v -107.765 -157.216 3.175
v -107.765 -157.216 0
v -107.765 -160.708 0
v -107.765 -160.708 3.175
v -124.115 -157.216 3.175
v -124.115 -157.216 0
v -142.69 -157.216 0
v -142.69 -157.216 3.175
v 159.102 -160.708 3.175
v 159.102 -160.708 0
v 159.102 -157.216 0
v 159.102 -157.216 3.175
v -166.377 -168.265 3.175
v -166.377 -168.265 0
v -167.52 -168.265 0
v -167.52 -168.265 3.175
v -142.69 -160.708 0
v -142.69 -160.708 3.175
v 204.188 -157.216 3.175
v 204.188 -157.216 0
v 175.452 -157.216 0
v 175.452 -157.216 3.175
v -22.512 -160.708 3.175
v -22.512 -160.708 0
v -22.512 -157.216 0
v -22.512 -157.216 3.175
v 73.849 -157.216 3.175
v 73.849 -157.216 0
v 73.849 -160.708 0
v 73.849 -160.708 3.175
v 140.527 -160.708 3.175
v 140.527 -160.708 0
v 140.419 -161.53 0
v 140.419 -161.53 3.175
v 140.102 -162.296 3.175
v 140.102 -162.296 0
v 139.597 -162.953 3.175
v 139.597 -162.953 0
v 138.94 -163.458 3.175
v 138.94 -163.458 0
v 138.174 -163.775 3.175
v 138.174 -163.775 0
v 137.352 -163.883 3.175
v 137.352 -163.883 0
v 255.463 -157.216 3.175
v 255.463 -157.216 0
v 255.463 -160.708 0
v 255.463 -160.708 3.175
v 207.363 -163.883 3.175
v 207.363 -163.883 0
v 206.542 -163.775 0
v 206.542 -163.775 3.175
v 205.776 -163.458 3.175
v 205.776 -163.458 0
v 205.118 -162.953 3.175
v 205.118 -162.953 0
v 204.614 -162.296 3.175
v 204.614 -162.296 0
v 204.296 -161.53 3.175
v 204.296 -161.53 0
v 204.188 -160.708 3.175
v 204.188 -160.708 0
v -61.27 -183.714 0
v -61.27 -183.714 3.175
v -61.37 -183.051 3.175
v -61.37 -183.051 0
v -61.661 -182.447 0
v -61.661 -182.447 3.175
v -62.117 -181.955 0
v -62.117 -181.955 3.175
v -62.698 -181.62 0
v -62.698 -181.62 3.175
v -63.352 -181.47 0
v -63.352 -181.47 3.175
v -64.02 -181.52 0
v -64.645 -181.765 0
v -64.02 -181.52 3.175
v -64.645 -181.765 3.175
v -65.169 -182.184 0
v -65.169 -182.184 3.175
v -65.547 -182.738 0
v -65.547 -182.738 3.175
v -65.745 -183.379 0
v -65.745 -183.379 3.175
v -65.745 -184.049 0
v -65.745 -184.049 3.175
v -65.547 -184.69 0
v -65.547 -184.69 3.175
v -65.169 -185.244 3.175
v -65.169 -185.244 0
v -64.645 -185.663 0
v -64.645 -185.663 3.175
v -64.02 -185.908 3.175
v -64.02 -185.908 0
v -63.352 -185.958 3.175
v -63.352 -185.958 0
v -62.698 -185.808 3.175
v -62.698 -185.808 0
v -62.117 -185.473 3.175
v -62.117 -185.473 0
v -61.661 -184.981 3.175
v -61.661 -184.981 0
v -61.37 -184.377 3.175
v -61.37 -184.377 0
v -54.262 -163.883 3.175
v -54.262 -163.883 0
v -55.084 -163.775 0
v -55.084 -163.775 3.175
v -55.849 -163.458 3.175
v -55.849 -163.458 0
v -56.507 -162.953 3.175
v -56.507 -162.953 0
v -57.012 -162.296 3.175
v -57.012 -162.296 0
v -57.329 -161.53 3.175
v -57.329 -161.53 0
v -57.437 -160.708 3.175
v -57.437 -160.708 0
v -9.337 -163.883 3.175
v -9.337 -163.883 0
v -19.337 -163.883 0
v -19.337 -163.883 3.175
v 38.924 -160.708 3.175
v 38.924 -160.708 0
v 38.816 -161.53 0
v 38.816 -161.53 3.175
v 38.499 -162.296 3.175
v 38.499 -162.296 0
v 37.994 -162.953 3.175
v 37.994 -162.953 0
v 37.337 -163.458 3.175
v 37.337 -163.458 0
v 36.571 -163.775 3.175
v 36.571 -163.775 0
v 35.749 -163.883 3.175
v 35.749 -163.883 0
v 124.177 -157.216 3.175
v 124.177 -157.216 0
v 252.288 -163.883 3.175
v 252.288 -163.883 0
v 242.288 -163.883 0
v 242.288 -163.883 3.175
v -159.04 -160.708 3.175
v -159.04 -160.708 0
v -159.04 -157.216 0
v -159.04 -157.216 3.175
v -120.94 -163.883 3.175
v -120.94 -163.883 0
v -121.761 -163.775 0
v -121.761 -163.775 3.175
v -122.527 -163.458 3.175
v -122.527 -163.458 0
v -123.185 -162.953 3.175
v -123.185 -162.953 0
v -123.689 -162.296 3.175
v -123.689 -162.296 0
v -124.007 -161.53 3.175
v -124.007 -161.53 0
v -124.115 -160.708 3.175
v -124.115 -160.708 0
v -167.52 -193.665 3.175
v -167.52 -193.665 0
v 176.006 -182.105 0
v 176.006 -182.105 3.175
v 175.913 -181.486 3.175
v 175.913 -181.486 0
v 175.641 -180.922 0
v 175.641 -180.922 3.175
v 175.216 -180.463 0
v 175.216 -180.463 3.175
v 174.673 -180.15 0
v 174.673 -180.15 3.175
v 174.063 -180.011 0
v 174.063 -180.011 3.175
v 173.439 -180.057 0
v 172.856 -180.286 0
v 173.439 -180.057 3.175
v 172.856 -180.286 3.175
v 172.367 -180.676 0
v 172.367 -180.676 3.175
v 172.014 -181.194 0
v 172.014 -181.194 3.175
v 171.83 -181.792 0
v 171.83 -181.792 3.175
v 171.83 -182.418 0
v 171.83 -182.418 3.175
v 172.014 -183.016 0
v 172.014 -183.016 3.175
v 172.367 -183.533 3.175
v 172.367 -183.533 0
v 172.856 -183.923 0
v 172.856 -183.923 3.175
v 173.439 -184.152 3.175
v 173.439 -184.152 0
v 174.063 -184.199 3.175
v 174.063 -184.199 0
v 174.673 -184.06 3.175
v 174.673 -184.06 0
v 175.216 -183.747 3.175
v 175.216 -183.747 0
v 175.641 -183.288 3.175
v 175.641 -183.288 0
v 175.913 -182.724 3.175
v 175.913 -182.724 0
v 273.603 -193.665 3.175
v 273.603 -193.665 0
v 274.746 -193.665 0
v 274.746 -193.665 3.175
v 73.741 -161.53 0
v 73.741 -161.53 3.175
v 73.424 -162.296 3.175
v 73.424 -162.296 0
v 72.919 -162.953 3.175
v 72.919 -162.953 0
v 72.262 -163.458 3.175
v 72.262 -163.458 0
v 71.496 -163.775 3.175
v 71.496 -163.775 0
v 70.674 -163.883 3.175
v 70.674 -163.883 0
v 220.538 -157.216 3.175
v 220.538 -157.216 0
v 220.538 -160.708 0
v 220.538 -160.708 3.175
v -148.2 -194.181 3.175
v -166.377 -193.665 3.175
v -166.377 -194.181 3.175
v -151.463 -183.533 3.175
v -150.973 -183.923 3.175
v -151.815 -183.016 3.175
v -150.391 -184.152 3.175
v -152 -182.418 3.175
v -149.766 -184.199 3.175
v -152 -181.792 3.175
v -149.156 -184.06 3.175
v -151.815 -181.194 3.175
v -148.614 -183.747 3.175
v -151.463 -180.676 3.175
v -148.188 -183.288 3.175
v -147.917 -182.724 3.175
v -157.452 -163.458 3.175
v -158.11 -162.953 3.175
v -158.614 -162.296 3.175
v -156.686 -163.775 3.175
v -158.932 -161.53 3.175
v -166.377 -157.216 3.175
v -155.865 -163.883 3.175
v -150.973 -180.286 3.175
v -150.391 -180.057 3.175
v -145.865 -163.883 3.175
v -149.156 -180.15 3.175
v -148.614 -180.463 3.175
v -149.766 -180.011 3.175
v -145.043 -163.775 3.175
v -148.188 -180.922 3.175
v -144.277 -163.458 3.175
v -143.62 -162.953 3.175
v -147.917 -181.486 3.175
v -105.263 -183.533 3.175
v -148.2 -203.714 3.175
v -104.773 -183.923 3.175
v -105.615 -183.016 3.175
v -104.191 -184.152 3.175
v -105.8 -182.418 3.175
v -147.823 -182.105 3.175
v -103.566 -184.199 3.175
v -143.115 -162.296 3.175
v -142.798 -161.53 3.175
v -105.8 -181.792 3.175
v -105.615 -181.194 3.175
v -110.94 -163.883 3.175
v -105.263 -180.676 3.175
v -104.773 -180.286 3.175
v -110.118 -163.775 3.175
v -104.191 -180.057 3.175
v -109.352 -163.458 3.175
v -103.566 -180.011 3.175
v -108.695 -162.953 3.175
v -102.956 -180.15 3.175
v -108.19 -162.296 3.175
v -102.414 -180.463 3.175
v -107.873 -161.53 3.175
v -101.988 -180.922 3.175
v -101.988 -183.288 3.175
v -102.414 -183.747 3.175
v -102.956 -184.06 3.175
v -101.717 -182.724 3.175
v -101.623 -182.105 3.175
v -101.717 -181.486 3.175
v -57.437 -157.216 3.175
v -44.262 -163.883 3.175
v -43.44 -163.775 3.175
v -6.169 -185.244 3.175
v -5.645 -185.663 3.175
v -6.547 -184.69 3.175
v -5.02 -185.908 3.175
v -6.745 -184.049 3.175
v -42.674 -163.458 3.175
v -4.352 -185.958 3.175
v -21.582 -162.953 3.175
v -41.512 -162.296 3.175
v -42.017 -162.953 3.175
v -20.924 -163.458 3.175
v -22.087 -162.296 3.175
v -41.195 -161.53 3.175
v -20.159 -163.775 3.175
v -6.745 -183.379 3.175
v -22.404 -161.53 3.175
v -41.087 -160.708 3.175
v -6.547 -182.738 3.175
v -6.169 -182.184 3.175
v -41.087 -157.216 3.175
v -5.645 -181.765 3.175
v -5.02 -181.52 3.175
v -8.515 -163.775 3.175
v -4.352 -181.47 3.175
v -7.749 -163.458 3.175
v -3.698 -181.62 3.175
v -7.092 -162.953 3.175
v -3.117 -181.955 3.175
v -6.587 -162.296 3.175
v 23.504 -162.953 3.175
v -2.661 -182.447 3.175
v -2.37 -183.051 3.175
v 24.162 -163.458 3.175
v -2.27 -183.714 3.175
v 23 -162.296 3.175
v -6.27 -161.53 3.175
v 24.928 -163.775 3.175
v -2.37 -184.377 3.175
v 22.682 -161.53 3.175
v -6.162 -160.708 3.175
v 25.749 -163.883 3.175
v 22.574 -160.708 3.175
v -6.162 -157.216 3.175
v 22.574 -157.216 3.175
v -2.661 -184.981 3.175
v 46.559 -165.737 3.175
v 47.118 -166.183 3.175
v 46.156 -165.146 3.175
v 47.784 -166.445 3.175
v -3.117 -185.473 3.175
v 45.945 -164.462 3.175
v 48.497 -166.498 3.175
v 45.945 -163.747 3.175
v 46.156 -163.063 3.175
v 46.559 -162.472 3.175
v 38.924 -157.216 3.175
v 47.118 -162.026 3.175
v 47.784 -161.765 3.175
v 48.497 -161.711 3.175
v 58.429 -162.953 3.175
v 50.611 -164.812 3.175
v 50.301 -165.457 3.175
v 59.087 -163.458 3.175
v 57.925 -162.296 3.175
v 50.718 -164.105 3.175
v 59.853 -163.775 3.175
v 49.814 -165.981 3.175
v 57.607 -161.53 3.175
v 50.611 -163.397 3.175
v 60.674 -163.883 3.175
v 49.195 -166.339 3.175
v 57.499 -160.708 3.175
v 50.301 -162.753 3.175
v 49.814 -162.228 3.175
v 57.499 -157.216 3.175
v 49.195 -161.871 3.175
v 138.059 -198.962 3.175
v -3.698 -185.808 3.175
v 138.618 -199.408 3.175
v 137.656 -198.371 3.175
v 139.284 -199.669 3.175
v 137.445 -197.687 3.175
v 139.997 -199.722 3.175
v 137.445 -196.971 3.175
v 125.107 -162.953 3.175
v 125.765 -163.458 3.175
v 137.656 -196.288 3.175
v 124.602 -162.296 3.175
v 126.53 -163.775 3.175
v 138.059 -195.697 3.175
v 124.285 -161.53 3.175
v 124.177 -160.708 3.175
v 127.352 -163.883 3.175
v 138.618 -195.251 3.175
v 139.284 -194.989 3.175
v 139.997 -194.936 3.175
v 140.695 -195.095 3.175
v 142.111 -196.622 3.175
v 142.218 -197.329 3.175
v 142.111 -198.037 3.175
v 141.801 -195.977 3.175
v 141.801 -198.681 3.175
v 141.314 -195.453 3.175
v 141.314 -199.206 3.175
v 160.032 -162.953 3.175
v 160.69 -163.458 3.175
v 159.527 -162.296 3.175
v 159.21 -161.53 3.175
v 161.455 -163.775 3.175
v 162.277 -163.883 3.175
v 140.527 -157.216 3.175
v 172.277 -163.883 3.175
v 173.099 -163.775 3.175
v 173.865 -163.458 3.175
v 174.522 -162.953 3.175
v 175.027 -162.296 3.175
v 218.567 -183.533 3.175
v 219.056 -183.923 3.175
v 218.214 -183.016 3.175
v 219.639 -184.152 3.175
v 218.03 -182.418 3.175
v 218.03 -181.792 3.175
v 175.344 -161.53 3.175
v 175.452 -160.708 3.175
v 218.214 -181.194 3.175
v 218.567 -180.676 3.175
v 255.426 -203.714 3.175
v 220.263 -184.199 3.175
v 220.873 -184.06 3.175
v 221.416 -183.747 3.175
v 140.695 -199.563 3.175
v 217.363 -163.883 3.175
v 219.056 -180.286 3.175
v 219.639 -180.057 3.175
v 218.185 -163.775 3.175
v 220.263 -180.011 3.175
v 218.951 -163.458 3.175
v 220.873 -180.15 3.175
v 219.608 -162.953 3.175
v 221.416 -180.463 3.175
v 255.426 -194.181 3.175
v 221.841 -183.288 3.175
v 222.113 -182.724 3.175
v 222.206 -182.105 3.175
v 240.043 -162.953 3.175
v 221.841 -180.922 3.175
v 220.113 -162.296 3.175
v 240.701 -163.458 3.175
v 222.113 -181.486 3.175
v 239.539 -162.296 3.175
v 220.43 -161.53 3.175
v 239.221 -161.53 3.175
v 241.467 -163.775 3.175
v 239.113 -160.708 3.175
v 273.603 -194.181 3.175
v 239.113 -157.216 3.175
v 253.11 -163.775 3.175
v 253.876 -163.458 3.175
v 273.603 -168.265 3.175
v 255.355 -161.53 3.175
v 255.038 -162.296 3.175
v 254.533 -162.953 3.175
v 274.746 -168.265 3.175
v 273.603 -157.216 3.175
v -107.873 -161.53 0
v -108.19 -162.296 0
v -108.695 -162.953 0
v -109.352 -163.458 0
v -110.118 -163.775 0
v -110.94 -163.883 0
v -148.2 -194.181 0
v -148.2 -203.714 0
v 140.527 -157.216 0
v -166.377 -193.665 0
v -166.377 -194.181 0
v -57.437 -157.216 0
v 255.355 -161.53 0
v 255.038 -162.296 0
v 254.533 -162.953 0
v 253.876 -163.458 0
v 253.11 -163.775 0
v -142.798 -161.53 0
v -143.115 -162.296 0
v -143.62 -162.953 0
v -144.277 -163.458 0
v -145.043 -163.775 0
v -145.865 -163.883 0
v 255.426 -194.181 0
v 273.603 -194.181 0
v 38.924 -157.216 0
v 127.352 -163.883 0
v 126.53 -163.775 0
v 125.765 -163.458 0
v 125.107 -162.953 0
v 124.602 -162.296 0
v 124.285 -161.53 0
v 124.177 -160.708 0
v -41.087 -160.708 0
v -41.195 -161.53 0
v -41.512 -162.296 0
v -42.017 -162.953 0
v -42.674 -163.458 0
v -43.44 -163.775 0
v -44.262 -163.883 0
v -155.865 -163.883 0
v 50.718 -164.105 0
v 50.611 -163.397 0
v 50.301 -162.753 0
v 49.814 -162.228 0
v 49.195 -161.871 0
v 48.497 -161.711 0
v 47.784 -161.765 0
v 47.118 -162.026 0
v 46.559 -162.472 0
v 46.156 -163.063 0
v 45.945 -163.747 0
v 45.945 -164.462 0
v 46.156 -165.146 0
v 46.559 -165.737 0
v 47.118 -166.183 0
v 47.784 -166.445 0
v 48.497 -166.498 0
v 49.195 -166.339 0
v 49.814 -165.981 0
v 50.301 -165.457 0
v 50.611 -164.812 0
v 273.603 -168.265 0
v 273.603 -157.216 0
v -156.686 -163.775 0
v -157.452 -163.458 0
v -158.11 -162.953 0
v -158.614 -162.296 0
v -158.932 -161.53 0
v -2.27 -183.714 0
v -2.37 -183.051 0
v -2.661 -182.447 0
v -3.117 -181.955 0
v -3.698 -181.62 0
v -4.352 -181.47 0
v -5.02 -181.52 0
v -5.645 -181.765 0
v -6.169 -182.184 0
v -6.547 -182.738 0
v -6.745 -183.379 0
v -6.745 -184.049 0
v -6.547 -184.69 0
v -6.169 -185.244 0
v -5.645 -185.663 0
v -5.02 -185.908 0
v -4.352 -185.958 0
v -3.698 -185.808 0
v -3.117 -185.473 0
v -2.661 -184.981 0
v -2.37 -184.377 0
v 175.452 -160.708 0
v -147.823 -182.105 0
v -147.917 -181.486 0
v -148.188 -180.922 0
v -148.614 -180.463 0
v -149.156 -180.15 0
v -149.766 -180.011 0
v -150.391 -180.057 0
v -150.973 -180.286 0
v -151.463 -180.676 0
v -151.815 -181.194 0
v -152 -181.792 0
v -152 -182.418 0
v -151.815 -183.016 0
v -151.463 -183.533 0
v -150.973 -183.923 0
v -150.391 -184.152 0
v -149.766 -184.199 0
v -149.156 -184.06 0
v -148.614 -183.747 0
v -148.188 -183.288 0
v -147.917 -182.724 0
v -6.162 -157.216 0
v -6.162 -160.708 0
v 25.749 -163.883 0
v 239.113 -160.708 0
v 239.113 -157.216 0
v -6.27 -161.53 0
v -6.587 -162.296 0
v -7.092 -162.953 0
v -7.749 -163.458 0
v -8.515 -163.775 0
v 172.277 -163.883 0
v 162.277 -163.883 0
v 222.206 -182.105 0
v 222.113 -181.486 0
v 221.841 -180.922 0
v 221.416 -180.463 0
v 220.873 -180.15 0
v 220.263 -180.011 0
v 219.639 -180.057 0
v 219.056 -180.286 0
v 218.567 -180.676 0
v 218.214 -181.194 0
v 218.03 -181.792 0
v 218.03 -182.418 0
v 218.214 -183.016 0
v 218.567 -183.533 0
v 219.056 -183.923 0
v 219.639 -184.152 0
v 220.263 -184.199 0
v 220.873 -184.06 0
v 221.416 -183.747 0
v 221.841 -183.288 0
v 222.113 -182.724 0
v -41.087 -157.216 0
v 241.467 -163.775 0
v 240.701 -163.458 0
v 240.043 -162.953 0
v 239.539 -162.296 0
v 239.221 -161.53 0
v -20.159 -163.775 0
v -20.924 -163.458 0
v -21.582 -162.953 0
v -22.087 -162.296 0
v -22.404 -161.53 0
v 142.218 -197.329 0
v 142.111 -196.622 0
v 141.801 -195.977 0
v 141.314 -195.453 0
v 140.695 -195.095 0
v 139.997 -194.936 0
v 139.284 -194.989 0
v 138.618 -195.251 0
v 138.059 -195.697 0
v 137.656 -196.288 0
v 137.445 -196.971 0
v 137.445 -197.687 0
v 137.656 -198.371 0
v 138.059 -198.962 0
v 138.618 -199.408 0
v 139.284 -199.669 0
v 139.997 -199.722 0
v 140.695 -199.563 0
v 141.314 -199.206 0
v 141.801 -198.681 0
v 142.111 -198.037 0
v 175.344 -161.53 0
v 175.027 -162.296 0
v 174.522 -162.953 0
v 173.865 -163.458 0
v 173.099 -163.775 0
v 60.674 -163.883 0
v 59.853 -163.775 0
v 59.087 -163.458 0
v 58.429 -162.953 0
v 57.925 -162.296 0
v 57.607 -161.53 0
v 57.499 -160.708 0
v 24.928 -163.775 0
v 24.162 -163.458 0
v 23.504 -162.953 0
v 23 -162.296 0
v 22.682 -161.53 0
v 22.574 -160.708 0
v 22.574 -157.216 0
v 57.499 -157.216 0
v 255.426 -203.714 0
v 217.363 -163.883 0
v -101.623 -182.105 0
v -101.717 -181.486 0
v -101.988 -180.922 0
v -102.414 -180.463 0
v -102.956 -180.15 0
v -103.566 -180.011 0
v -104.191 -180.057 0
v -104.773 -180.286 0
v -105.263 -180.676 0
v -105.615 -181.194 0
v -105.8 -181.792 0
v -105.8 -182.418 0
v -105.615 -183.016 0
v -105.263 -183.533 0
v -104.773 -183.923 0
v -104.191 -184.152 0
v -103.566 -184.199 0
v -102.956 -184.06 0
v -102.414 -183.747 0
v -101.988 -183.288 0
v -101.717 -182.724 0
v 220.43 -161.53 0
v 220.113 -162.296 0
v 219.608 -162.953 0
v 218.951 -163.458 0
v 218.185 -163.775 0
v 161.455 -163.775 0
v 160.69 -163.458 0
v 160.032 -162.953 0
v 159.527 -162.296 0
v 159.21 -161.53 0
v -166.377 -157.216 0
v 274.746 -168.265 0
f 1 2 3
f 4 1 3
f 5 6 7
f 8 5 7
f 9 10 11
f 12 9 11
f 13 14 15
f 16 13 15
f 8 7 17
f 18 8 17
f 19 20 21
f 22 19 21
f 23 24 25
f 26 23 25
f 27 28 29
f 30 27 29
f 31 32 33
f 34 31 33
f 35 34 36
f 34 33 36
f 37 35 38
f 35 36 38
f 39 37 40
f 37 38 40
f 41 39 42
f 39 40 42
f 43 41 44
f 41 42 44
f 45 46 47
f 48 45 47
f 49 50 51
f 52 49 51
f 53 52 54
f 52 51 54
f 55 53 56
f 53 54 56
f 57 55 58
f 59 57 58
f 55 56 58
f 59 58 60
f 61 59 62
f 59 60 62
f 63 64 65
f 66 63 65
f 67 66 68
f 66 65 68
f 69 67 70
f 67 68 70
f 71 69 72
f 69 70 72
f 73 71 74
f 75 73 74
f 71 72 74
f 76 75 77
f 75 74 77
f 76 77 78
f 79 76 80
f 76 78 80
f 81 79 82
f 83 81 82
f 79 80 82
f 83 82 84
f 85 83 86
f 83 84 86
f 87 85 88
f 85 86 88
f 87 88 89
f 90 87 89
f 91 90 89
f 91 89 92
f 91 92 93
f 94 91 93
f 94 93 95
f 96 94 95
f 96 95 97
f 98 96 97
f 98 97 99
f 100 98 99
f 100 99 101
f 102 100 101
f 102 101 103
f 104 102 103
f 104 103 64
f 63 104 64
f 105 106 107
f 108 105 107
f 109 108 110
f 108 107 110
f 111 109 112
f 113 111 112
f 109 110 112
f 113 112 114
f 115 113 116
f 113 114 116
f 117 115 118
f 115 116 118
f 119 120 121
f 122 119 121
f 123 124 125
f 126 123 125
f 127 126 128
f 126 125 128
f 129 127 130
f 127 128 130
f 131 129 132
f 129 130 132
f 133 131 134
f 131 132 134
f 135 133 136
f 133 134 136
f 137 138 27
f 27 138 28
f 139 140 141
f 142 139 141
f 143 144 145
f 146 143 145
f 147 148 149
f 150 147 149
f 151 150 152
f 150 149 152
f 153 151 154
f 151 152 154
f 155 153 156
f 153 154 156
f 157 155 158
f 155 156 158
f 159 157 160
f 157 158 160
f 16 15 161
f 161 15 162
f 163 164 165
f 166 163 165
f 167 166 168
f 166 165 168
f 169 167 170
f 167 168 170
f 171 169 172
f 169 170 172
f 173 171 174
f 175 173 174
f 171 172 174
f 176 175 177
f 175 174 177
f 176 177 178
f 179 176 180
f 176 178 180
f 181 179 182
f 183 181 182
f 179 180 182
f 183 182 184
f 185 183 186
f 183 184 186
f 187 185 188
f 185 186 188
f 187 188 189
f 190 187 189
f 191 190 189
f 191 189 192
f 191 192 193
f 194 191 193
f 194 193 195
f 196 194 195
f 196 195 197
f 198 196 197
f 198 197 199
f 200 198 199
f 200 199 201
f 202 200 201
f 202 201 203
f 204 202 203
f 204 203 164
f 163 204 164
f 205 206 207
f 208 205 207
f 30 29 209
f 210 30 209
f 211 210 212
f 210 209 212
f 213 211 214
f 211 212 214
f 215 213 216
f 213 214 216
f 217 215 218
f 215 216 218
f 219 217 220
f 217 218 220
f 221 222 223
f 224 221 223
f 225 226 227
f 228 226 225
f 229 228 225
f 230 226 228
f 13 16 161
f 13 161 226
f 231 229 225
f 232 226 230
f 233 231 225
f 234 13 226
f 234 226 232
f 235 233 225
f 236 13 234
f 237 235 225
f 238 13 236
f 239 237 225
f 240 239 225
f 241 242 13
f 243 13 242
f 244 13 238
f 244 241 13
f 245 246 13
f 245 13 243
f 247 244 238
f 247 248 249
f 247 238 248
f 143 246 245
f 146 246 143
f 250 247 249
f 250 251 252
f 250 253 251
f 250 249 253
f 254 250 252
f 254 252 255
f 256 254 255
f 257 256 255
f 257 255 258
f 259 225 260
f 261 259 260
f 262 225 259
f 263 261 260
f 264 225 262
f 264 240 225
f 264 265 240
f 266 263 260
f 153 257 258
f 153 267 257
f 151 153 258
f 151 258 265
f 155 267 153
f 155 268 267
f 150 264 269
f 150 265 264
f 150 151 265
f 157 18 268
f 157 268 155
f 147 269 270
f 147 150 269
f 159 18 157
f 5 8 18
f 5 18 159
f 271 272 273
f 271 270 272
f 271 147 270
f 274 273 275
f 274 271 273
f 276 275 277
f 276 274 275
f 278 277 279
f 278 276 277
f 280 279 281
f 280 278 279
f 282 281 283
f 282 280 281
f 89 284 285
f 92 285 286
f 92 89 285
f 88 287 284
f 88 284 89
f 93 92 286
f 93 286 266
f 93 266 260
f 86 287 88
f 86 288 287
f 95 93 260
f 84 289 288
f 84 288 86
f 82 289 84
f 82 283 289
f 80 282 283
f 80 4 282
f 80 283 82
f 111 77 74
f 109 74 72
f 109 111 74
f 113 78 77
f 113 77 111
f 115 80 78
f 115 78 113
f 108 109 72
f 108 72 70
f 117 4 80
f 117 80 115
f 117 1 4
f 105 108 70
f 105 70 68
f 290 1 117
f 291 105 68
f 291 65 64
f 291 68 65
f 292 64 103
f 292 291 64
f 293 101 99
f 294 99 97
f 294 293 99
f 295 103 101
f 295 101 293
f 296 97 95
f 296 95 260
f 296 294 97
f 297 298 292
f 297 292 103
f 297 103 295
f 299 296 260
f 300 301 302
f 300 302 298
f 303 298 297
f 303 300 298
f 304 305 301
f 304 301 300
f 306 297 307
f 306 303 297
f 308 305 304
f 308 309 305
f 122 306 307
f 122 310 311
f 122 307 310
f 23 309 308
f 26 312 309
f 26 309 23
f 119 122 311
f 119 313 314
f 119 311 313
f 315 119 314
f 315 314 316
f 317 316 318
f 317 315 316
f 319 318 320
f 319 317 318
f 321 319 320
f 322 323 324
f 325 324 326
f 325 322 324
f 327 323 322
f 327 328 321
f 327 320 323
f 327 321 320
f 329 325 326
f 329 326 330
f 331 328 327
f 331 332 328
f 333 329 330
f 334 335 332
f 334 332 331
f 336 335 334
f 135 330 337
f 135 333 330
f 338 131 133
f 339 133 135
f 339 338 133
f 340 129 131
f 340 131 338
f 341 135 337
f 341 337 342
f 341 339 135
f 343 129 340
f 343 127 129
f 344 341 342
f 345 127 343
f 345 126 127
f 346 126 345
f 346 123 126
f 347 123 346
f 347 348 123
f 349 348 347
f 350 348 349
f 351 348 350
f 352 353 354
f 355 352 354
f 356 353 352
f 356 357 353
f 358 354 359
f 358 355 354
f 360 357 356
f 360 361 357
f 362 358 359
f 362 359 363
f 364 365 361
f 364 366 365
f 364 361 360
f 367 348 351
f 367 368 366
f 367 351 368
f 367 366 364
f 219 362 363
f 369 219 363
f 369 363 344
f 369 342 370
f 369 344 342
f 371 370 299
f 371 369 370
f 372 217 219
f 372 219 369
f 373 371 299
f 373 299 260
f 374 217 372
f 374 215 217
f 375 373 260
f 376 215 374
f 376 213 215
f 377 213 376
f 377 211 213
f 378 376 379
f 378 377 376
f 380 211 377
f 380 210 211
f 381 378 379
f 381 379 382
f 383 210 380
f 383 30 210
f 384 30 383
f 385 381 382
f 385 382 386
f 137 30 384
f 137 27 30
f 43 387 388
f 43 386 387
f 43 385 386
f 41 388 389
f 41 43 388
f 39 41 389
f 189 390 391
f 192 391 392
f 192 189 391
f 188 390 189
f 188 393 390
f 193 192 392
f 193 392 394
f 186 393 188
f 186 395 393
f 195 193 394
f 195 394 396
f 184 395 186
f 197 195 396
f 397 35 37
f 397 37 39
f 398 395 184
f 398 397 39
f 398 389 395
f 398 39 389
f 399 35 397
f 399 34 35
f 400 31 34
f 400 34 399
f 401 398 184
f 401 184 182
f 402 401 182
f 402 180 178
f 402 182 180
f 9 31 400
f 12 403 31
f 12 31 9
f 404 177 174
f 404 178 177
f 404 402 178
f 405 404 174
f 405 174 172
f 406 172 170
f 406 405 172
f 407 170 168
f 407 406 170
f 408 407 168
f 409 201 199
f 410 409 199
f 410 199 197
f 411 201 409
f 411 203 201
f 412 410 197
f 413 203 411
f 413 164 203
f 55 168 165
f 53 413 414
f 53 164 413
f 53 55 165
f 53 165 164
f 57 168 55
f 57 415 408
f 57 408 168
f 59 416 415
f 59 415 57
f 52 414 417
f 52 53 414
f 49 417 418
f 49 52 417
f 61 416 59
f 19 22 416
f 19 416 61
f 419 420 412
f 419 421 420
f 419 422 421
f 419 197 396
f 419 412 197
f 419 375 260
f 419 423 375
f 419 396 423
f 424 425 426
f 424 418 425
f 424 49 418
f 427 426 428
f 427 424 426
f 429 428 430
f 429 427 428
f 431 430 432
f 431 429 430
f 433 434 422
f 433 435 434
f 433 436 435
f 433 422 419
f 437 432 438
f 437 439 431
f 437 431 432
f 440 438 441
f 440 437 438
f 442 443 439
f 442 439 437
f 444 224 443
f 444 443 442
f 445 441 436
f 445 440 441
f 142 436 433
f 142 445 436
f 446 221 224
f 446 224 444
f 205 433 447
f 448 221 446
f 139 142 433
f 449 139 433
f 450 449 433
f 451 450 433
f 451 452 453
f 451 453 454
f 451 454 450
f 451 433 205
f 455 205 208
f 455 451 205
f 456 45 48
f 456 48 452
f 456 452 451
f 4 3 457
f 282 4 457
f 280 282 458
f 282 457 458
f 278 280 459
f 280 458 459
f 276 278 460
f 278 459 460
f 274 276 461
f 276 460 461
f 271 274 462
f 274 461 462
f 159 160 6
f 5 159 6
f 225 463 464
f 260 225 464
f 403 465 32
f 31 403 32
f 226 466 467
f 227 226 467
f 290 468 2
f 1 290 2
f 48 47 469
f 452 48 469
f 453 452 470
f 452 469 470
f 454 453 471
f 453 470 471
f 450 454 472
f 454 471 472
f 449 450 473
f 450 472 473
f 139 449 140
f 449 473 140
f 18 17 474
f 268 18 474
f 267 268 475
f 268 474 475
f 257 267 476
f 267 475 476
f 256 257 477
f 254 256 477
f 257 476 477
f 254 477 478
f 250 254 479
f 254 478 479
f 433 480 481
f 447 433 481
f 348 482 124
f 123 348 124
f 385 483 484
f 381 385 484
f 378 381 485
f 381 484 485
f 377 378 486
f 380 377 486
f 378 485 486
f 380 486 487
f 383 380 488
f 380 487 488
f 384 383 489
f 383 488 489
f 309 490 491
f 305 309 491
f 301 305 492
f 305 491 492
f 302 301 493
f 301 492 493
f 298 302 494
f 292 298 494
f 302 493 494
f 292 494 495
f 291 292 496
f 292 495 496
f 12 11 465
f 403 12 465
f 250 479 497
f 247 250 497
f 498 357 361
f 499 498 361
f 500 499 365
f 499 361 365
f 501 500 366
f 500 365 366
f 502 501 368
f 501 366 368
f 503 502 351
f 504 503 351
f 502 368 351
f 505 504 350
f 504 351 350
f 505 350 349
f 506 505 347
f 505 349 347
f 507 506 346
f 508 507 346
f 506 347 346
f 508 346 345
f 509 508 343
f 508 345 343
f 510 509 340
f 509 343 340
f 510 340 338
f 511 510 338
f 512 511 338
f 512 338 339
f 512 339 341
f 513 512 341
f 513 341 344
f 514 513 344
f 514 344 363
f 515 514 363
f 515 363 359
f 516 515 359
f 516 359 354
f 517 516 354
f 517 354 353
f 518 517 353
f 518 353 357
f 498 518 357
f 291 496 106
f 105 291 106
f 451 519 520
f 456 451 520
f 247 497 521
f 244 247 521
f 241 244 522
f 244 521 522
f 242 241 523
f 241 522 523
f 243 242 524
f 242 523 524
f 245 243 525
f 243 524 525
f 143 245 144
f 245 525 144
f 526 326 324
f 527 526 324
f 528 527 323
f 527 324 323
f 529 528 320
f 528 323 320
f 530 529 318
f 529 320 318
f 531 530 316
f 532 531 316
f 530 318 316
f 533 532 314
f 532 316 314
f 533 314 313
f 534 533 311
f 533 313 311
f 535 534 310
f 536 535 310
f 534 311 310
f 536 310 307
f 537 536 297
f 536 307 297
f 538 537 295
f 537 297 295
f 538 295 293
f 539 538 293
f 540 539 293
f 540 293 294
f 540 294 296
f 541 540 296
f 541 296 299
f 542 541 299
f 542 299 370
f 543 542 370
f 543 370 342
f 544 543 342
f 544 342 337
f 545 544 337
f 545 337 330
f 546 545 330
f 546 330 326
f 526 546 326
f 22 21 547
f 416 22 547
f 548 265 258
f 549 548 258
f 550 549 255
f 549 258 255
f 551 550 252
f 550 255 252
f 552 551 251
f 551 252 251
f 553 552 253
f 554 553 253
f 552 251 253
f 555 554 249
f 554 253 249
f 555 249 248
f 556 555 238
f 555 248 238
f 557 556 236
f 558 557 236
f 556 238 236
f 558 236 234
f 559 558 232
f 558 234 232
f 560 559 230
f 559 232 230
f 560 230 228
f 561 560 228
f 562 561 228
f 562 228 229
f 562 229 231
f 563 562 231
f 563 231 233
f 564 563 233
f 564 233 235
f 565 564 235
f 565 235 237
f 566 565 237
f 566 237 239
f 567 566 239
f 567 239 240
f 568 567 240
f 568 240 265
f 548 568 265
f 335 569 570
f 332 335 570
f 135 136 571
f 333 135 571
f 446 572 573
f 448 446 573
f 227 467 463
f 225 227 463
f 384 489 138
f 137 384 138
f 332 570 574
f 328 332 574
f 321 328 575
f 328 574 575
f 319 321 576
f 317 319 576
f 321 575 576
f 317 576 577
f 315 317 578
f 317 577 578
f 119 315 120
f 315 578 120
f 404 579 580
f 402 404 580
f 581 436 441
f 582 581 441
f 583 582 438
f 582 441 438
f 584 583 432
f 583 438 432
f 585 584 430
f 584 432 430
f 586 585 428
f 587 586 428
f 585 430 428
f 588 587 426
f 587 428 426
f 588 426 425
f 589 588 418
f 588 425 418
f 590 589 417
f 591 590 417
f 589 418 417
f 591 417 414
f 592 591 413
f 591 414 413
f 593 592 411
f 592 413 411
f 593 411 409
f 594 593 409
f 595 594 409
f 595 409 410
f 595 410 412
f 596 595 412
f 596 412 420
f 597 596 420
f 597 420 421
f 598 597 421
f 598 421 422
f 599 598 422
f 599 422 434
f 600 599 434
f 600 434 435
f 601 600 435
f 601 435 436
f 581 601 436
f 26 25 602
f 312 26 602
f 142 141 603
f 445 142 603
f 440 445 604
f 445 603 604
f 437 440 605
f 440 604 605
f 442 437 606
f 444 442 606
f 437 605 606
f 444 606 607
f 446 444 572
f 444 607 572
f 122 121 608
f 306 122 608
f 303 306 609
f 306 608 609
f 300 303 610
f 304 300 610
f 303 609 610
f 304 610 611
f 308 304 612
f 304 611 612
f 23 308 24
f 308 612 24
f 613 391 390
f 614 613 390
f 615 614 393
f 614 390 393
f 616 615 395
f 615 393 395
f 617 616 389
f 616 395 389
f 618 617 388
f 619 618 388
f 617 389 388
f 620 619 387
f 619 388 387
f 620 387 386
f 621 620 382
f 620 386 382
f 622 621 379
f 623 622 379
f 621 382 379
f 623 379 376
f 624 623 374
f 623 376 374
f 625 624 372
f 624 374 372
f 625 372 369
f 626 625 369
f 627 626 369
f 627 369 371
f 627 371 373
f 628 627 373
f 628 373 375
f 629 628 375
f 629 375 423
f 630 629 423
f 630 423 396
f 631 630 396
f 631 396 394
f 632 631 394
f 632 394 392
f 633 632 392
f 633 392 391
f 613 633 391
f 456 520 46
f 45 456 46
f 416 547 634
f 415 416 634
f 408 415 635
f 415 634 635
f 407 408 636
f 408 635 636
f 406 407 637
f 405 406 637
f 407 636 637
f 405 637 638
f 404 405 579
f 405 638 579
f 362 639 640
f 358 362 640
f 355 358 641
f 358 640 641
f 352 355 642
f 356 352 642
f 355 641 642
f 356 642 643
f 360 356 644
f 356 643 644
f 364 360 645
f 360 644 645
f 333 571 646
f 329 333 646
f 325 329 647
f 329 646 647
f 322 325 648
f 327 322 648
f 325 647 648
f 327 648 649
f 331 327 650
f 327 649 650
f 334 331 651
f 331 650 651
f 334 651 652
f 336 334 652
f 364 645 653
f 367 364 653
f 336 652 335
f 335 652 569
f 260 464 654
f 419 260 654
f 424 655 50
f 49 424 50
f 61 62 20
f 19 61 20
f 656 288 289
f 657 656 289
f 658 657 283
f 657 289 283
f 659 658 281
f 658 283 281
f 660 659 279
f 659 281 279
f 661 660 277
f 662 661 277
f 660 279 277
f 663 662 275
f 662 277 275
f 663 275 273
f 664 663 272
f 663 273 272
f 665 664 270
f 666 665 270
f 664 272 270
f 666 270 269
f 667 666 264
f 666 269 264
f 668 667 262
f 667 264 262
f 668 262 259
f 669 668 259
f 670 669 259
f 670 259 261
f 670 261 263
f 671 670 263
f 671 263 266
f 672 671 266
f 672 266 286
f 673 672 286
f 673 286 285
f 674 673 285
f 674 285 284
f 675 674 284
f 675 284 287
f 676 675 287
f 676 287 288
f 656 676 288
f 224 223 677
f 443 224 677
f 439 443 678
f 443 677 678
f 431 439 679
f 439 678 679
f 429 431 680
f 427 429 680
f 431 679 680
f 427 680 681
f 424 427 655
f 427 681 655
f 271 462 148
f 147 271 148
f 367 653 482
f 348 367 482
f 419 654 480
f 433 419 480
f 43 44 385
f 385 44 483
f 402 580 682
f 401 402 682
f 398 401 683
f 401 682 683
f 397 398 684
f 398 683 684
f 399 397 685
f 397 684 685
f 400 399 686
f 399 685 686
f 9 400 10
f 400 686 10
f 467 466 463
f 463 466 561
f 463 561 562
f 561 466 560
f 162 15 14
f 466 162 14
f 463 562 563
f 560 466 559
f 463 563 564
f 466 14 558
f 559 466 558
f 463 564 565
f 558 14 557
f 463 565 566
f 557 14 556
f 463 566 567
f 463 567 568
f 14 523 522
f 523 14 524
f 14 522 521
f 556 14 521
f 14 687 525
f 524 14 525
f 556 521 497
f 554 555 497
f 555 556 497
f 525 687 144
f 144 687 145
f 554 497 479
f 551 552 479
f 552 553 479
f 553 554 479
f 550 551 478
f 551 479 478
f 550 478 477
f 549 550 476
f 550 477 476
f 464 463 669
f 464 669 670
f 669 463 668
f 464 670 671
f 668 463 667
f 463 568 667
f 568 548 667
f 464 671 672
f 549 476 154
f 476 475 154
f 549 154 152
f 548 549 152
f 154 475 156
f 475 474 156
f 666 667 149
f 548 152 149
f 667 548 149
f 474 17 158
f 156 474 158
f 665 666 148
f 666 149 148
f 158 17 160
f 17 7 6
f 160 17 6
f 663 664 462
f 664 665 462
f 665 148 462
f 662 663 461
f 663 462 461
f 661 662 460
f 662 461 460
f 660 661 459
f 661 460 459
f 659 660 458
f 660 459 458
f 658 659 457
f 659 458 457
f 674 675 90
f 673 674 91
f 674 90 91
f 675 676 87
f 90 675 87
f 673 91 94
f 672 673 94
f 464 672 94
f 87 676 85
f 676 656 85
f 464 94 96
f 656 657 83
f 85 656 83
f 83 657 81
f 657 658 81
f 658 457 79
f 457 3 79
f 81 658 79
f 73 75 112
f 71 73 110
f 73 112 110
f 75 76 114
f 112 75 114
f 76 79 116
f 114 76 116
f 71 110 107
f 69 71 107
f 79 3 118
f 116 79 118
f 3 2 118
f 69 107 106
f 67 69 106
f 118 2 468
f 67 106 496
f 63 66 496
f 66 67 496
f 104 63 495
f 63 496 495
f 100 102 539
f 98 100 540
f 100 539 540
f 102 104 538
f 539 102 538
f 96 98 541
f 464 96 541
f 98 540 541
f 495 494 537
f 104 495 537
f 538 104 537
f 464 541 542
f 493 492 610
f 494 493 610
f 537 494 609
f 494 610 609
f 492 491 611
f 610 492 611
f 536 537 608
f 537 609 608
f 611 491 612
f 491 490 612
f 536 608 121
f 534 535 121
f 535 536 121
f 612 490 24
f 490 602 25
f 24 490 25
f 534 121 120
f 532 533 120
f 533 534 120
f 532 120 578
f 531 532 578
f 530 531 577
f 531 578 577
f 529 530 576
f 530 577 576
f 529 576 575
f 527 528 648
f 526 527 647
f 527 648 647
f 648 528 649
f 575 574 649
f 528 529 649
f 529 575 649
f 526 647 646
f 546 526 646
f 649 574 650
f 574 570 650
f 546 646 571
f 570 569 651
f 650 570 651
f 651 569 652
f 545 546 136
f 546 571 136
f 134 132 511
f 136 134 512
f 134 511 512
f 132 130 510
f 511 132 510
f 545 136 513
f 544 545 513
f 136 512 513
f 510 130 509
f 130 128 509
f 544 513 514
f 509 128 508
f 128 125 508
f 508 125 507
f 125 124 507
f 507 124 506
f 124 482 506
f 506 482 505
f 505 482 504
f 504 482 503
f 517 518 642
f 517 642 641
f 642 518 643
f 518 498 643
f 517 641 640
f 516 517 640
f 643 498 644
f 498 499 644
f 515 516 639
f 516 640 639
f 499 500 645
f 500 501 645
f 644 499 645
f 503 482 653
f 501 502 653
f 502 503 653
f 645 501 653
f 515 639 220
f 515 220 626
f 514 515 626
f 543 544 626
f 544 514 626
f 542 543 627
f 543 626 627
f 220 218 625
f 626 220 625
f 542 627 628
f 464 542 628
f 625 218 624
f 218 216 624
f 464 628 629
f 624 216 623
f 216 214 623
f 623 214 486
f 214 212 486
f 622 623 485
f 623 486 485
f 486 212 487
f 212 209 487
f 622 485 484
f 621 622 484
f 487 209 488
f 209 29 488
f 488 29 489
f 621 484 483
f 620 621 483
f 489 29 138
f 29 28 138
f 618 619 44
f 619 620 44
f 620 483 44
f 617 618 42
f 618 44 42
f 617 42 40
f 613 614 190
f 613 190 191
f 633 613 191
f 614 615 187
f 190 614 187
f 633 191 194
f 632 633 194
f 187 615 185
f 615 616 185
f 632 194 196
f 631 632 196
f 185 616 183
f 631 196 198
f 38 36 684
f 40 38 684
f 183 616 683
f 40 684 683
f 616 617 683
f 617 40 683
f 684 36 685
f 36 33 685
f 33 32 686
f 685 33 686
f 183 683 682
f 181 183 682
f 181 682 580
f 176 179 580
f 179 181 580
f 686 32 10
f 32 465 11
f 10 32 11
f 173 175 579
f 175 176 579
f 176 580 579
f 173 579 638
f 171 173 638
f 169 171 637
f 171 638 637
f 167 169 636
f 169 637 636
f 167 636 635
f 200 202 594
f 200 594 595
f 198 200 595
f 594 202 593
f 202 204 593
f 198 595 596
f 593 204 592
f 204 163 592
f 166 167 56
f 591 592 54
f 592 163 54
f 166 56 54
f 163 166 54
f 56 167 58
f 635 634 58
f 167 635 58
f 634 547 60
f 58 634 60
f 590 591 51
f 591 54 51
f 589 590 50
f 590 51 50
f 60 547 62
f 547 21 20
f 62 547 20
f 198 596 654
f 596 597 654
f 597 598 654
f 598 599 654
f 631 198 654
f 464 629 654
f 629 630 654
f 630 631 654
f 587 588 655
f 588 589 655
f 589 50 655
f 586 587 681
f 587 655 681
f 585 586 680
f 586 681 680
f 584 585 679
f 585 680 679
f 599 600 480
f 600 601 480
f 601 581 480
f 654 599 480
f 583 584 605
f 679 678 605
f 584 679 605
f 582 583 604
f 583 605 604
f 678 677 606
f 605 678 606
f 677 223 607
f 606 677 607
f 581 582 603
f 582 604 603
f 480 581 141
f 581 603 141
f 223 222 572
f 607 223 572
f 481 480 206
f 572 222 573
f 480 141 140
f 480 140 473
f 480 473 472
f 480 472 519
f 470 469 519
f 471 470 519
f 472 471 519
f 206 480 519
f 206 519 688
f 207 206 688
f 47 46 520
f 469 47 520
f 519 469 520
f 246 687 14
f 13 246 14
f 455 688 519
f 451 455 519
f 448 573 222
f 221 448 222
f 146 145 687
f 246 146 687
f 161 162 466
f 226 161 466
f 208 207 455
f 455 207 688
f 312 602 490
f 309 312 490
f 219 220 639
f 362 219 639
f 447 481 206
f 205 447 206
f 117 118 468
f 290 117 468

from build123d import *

# Parameters (mm, degrees)
BOSS_EXTRUDE1_DEPTH = 3.175
SKETCH4_R           = 2.1
SKETCH4_R_2         = 2.25
SKETCH4_R_3         = 2.4
CUT_EXTRUDE2_DEPTH  = 343.045224939


with BuildPart() as part:
    # Sketch2 → Boss-Extrude1 (new body)
    with BuildSketch(Plane.XY):
        with BuildLine():
            Line((-166.376823509, -157.21600002), (-166.376823509, -167.12200002))
            Line((-166.376823509, -167.12200002), (-166.376823509, -168.26500002))
            Line((-166.376823509, -168.26500002), (-167.519823509, -168.26500002))
            Line((-167.519823509, -168.26500002), (-167.519823509, -187.31500002))
            Line((-167.519823509, -187.31500002), (-167.519823509, -193.66500002))
            Line((-167.519823509, -193.66500002), (-166.376823509, -193.66500002))
            Line((-166.376823509, -193.66500002), (-166.376823509, -194.18100002))
            Line((-166.376823509, -194.18100002), (-148.199823509, -194.18100002))
            Line((-148.199823509, -194.18100002), (-148.199823509, -203.71400002))
            Line((-148.199823509, -203.71400002), (255.426176451, -203.71400002))
            Line((255.426176451, -203.71400002), (255.426176451, -194.18100002))
            Line((255.426176451, -194.18100002), (273.603176451, -194.18100002))
            Line((273.603176451, -194.18100002), (273.603176451, -193.66500002))
            Line((273.603176451, -193.66500002), (274.746176451, -193.66500002))
            Line((274.746176451, -193.66500002), (274.746176451, -174.61500002))
            Line((274.746176451, -174.61500002), (274.746176451, -168.26500002))
            Line((274.746176451, -168.26500002), (273.603176451, -168.26500002))
            Line((273.603176451, -168.26500002), (273.603176451, -167.12200002))
            Line((273.603176451, -167.12200002), (273.603176451, -157.21600002))
            Line((273.603176451, -157.21600002), (255.463301471, -157.21600002))
            Line((255.463301471, -157.21600002), (255.463301471, -160.70800002))
            ThreePointArc((255.463301471, -160.70800002), (254.533365501, -162.95306405), (252.288301471, -163.88300002))
            Line((252.288301471, -163.88300002), (242.288301471, -163.88300002))
            ThreePointArc((242.288301471, -163.88300002), (240.04323744, -162.95306405), (239.113301471, -160.70800002))
            Line((239.113301471, -160.70800002), (239.113301471, -157.21600002))
            Line((239.113301471, -157.21600002), (220.538301471, -157.21600002))
            Line((220.538301471, -157.21600002), (220.538301471, -160.70800002))
            ThreePointArc((220.538301471, -160.70800002), (219.608365501, -162.95306405), (217.363301471, -163.88300002))
            Line((217.363301471, -163.88300002), (207.363301471, -163.88300002))
            ThreePointArc((207.363301471, -163.88300002), (205.11823744, -162.95306405), (204.188301471, -160.70800002))
            Line((204.188301471, -160.70800002), (204.188301471, -157.21600002))
            Line((204.188301471, -157.21600002), (175.452051471, -157.21600002))
            Line((175.452051471, -157.21600002), (175.452051471, -160.70800002))
            ThreePointArc((175.452051471, -160.70800002), (174.522115501, -162.95306405), (172.277051471, -163.88300002))
            Line((172.277051471, -163.88300002), (162.277051471, -163.88300002))
            ThreePointArc((162.277051471, -163.88300002), (160.03198744, -162.95306405), (159.102051471, -160.70800002))
            Line((159.102051471, -160.70800002), (159.102051471, -157.21600002))
            Line((159.102051471, -157.21600002), (140.527051471, -157.21600002))
            Line((140.527051471, -157.21600002), (140.527051471, -160.70800002))
            ThreePointArc((140.527051471, -160.70800002), (139.597115501, -162.95306405), (137.352051471, -163.88300002))
            Line((137.352051471, -163.88300002), (127.352051471, -163.88300002))
            ThreePointArc((127.352051471, -163.88300002), (125.10698744, -162.95306405), (124.177051471, -160.70800002))
            Line((124.177051471, -160.70800002), (124.177051471, -157.21600002))
            Line((124.177051471, -157.21600002), (73.849301471, -157.21600002))
            Line((73.849301471, -157.21600002), (73.849301471, -160.70800002))
            ThreePointArc((73.849301471, -160.70800002), (72.919365501, -162.95306405), (70.674301471, -163.88300002))
            Line((70.674301471, -163.88300002), (60.674301471, -163.88300002))
            ThreePointArc((60.674301471, -163.88300002), (58.42923744, -162.95306405), (57.499301471, -160.70800002))
            Line((57.499301471, -160.70800002), (57.499301471, -157.21600002))
            Line((57.499301471, -157.21600002), (38.924301471, -157.21600002))
            Line((38.924301471, -157.21600002), (38.924301471, -160.70800002))
            ThreePointArc((38.924301471, -160.70800002), (37.994365501, -162.95306405), (35.749301471, -163.88300002))
            Line((35.749301471, -163.88300002), (25.749301471, -163.88300002))
            ThreePointArc((25.749301471, -163.88300002), (23.50423744, -162.95306405), (22.574301471, -160.70800002))
            Line((22.574301471, -160.70800002), (22.574301471, -157.21600002))
            Line((22.574301471, -157.21600002), (-6.161948529, -157.21600002))
            Line((-6.161948529, -157.21600002), (-6.161948529, -160.70800002))
            ThreePointArc((-6.161948529, -160.70800002), (-7.091884499, -162.95306405), (-9.336948529, -163.88300002))
            Line((-9.336948529, -163.88300002), (-19.336948529, -163.88300002))
            ThreePointArc((-19.336948529, -163.88300002), (-21.58201256, -162.95306405), (-22.511948529, -160.70800002))
            Line((-22.511948529, -160.70800002), (-22.511948529, -157.21600002))
            Line((-22.511948529, -157.21600002), (-41.086948529, -157.21600002))
            Line((-41.086948529, -157.21600002), (-41.086948529, -160.70800002))
            ThreePointArc((-41.086948529, -160.70800002), (-42.016884499, -162.95306405), (-44.261948529, -163.88300002))
            Line((-44.261948529, -163.88300002), (-54.261948529, -163.88300002))
            ThreePointArc((-54.261948529, -163.88300002), (-56.50701256, -162.95306405), (-57.436948529, -160.70800002))
            Line((-57.436948529, -160.70800002), (-57.436948529, -157.21600002))
            Line((-57.436948529, -157.21600002), (-107.764698529, -157.21600002))
            Line((-107.764698529, -157.21600002), (-107.764698529, -160.70800002))
            ThreePointArc((-107.764698529, -160.70800002), (-108.694634499, -162.95306405), (-110.939698529, -163.88300002))
            Line((-110.939698529, -163.88300002), (-120.939698529, -163.88300002))
            ThreePointArc((-120.939698529, -163.88300002), (-123.18476256, -162.95306405), (-124.114698529, -160.70800002))
            Line((-124.114698529, -160.70800002), (-124.114698529, -157.21600002))
            Line((-124.114698529, -157.21600002), (-142.689698529, -157.21600002))
            Line((-142.689698529, -157.21600002), (-142.689698529, -160.70800002))
            ThreePointArc((-142.689698529, -160.70800002), (-143.619634499, -162.95306405), (-145.864698529, -163.88300002))
            Line((-145.864698529, -163.88300002), (-155.864698529, -163.88300002))
            ThreePointArc((-155.864698529, -163.88300002), (-158.10976256, -162.95306405), (-159.039698529, -160.70800002))
            Line((-159.039698529, -160.70800002), (-159.039698529, -157.21600002))
            Line((-159.039698529, -157.21600002), (-166.376823509, -157.21600002))
        make_face()
    extrude(amount=BOSS_EXTRUDE1_DEPTH)

    # Sketch4 → Cut-Extrude2 (cut, through all)
    with BuildSketch(Plane.XY.offset(3.175)):
        with Locations((220.106176451, -182.10474)):
            Circle(SKETCH4_R)
        with Locations((173.906176451, -182.10474)):
            Circle(SKETCH4_R)
        with Locations((-4.519823509, -183.71400002)):
            Circle(SKETCH4_R_2)
        with Locations((-63.519823509, -183.71400002)):
            Circle(SKETCH4_R_2)
        with Locations((-103.723323529, -182.10474)):
            Circle(SKETCH4_R)
        with Locations((-149.923323529, -182.10474)):
            Circle(SKETCH4_R)
        with Locations((48.318076451, -164.10474)):
            Circle(SKETCH4_R_3)
        with Locations((139.818076451, -197.329197785)):
            Circle(SKETCH4_R_3)
    extrude(amount=-CUT_EXTRUDE2_DEPTH, mode=Mode.SUBTRACT)


solid = part.part
